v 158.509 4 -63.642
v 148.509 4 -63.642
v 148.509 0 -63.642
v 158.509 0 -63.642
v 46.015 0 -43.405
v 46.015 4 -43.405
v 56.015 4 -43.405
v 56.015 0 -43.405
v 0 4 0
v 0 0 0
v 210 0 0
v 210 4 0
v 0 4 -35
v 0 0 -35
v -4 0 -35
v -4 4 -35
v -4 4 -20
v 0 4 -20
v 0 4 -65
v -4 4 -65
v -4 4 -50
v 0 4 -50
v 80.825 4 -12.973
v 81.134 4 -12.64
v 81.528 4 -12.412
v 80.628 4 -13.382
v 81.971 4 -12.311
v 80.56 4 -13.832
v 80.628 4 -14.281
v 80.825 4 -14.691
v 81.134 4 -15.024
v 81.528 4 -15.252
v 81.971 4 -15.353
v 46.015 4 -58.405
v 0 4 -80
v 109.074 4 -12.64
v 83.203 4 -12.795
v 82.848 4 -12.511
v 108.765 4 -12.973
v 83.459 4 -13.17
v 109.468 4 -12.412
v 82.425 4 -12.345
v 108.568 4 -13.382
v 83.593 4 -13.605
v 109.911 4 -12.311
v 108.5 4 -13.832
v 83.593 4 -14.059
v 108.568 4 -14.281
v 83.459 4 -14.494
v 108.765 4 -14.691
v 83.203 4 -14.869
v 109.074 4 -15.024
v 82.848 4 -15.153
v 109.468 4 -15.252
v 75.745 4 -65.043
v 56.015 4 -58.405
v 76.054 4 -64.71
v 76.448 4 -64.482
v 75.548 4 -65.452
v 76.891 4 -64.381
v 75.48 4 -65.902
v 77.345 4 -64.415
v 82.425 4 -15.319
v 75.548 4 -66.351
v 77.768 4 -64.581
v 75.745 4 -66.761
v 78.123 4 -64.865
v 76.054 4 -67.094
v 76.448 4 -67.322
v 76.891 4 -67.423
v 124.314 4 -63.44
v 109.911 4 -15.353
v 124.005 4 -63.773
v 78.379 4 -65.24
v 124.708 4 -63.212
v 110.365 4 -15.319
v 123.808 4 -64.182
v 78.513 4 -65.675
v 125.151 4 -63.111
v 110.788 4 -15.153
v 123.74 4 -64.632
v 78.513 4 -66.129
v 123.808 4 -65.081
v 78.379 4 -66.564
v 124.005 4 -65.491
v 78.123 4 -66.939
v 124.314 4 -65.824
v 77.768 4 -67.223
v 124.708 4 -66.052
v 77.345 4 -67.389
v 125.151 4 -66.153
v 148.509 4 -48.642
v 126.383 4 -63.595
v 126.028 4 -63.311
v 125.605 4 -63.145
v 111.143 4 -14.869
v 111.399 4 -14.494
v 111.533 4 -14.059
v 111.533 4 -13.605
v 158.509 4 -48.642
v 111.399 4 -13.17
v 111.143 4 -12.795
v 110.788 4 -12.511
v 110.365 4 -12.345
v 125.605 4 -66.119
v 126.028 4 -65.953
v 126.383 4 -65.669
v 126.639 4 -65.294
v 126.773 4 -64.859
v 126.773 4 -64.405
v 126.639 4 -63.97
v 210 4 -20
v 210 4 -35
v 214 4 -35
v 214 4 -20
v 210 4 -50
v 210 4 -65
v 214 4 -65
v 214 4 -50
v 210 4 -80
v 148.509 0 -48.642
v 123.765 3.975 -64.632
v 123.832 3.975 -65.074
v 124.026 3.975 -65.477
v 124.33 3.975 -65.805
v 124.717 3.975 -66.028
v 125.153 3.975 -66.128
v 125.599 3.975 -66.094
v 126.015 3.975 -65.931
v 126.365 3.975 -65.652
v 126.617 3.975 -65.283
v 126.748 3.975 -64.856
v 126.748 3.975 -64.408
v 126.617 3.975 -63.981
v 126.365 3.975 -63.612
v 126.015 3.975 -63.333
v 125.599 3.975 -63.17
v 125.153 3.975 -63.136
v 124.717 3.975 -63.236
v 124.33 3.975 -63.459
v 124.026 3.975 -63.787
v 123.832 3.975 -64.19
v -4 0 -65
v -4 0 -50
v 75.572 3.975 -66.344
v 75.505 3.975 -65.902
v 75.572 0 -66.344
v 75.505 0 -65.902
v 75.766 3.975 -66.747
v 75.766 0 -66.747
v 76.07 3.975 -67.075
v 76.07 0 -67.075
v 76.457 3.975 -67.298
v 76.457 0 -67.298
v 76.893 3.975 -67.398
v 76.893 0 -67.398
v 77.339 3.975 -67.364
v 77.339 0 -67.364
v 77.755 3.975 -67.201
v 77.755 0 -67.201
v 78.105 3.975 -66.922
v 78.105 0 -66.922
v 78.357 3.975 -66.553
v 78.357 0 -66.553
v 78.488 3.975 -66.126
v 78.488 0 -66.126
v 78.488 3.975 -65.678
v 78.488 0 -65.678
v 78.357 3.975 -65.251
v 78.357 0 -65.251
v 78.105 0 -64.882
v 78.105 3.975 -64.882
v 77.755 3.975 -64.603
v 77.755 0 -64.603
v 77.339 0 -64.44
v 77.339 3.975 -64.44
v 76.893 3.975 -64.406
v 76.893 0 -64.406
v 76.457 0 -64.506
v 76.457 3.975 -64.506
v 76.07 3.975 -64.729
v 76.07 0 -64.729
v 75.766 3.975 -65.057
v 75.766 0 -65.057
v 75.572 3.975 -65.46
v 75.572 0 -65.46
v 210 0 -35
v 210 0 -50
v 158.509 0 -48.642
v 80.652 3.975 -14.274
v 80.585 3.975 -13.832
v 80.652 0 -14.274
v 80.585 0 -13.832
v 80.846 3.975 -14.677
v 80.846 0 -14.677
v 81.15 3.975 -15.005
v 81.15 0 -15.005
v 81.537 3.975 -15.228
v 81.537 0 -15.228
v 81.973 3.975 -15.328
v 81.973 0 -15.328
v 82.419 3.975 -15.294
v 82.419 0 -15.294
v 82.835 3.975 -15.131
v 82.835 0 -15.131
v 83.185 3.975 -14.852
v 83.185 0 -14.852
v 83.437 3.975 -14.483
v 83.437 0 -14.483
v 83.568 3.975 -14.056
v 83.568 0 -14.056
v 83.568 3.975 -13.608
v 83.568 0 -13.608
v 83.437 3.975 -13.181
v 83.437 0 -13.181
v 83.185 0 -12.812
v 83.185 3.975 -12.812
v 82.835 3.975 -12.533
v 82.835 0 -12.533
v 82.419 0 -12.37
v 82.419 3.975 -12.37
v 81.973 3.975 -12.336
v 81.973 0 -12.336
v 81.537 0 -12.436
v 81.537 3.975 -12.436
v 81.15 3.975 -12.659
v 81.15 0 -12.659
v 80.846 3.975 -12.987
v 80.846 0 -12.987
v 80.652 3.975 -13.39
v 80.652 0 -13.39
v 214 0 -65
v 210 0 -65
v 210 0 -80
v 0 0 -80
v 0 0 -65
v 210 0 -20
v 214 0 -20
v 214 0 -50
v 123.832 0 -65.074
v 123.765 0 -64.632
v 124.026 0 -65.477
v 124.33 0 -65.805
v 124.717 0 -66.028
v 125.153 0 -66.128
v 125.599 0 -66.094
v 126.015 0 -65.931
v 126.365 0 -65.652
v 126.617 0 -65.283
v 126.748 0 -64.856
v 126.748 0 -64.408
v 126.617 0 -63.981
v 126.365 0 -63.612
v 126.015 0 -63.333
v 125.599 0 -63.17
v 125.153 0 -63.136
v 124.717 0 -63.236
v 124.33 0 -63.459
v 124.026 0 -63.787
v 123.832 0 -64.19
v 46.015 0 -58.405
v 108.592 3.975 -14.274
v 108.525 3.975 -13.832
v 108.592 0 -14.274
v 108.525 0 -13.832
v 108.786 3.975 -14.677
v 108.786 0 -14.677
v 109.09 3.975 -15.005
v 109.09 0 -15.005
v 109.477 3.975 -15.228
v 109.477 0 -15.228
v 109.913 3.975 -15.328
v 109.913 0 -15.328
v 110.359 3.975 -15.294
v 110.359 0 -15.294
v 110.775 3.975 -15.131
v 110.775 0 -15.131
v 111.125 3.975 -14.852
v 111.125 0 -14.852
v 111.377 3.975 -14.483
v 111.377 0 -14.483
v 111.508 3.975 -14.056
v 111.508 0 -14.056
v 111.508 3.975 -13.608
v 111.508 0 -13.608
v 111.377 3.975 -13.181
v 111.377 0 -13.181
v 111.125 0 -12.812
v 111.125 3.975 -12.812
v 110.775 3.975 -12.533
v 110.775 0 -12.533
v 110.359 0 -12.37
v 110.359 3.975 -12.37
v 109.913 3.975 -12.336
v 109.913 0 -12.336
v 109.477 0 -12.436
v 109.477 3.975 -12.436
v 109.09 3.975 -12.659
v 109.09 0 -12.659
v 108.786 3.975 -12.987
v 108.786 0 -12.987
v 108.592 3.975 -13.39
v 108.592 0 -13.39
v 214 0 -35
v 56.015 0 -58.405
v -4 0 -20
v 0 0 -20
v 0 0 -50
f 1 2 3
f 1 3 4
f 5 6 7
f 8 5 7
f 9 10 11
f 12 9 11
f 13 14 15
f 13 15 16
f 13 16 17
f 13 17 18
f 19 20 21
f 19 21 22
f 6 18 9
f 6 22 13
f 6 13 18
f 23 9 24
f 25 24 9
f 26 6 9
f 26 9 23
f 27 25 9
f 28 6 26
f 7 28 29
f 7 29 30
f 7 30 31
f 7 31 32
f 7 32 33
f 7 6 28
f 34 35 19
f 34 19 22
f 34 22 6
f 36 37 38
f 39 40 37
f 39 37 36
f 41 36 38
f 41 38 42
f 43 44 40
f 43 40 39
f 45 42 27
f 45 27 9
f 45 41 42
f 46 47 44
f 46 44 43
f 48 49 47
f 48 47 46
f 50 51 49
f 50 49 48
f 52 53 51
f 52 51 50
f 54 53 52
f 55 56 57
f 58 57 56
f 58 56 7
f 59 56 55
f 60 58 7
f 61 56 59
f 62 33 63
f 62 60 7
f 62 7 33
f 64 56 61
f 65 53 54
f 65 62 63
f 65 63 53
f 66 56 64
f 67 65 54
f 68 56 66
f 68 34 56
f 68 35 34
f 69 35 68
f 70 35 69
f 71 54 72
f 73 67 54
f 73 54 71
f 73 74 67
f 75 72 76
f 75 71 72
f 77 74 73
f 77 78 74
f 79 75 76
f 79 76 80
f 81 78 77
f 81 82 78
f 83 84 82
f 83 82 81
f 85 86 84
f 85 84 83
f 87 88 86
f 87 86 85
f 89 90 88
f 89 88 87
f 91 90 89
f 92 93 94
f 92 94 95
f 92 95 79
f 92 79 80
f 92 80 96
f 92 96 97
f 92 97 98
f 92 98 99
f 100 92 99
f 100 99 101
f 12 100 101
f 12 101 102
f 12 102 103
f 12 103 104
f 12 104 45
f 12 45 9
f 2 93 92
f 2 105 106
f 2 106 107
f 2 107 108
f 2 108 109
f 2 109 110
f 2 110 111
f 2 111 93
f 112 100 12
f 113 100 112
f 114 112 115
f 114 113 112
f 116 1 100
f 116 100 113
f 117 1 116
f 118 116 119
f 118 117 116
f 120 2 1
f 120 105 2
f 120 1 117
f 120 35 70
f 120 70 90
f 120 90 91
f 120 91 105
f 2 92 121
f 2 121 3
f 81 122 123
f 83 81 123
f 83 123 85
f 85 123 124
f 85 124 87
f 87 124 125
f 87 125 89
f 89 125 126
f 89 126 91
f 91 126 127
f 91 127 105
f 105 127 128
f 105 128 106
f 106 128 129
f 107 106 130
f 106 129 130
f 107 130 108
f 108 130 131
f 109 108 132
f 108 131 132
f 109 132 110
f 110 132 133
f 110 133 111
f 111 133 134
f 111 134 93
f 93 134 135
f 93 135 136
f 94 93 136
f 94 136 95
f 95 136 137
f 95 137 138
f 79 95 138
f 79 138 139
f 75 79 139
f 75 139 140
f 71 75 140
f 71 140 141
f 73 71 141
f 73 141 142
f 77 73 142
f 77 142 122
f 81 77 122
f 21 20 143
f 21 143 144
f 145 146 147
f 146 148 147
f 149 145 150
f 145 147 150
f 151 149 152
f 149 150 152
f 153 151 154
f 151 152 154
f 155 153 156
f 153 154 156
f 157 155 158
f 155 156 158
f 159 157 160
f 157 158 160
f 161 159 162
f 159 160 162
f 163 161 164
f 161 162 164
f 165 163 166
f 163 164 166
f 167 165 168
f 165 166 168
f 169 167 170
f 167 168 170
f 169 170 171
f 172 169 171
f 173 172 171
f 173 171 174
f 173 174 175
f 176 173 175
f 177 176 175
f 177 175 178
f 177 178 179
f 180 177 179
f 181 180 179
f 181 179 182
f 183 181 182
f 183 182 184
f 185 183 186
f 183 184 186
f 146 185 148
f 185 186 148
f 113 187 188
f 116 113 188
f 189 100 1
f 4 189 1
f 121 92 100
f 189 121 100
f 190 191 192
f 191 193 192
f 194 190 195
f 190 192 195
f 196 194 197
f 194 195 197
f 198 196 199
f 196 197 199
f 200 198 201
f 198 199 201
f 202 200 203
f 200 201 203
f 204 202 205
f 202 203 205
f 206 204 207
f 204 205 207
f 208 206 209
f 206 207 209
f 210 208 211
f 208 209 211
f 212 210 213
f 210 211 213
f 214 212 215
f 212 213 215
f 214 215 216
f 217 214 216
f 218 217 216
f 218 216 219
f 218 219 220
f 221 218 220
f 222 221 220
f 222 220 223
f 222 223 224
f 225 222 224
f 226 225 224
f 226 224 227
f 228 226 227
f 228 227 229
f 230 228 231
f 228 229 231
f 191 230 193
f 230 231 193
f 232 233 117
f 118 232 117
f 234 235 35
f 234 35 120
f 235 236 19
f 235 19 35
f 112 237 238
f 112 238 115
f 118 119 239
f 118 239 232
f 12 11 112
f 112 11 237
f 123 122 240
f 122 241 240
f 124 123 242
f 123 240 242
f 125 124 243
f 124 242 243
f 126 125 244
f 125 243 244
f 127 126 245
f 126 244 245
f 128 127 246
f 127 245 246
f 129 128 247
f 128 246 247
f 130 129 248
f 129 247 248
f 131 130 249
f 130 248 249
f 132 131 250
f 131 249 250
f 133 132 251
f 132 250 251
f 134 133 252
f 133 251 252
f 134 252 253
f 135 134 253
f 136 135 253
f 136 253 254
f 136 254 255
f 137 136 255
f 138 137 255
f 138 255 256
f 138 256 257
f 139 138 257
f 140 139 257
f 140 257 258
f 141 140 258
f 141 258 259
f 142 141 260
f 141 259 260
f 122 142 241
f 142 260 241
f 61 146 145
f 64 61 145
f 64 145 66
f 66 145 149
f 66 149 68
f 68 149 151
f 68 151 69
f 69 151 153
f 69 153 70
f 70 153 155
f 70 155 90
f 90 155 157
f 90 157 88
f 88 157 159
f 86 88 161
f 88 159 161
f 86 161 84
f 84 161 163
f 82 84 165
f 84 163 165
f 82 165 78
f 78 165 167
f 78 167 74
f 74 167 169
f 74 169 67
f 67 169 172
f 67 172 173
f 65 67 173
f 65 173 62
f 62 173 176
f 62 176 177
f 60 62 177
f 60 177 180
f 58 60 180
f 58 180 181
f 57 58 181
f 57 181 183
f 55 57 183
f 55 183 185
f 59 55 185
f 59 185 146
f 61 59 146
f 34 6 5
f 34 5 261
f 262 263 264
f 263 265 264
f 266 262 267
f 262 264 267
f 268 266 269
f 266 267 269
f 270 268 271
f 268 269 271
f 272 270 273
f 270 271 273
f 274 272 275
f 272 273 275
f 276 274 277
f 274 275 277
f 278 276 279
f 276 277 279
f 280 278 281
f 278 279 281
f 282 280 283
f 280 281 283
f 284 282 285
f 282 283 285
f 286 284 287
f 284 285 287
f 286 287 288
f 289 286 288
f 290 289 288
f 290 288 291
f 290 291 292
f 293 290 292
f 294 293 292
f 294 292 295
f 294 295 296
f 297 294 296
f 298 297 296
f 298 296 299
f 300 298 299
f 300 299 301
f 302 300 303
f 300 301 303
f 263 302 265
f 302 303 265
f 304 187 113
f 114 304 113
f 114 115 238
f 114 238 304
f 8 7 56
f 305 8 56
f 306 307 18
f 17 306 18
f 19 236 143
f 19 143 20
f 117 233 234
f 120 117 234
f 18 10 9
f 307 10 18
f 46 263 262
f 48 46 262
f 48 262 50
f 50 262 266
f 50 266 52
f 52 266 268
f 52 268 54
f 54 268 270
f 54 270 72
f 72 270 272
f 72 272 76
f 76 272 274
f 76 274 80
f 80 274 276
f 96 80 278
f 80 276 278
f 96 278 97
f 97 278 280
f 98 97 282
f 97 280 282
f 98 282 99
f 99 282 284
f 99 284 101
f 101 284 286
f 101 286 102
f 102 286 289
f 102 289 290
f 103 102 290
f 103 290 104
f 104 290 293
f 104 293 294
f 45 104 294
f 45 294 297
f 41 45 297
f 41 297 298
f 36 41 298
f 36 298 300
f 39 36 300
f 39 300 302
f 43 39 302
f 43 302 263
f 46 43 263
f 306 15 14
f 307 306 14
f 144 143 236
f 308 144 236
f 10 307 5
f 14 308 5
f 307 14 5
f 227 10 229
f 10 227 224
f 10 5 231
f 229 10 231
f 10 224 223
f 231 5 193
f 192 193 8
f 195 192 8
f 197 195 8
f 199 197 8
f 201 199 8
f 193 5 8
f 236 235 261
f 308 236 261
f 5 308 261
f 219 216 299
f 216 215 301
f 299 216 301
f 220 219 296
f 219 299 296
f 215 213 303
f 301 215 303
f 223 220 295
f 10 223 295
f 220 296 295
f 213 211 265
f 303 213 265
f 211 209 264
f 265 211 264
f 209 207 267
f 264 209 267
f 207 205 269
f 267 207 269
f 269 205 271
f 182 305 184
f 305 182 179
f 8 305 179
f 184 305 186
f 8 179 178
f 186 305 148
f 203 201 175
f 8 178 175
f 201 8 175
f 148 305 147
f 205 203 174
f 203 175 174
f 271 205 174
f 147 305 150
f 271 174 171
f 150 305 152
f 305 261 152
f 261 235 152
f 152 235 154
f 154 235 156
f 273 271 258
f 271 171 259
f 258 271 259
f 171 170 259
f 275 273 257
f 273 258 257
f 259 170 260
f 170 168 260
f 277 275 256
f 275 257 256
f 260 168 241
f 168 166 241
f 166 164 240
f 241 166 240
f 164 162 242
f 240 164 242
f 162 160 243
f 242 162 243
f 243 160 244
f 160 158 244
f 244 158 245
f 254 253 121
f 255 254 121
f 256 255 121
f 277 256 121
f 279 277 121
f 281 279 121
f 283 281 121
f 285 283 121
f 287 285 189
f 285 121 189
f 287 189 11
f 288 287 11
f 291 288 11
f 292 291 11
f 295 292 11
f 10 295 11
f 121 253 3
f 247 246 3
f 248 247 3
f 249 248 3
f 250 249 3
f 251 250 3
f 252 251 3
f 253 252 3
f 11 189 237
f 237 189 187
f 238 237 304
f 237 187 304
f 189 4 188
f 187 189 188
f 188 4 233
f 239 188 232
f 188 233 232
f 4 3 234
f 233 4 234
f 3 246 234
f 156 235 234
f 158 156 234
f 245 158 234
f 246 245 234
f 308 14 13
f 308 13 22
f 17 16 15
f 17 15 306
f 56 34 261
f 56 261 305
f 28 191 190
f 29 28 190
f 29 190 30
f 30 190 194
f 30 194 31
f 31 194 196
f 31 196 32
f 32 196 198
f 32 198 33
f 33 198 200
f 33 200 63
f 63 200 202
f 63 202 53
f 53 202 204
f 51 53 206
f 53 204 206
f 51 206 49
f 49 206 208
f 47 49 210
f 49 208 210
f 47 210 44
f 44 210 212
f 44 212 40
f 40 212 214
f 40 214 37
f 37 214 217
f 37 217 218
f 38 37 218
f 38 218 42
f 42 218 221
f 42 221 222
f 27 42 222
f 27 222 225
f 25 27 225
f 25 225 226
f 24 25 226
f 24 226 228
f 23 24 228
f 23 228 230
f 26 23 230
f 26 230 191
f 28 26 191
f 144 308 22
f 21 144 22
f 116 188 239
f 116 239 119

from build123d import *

# Parameters (mm, degrees)
SKETCH1_W                       = 210
SKETCH1_H                       = 80
BOSS_EXTRUDE1_DEPTH             = 4
SKETCH2_W                       = 10
SKETCH2_H                       = 15
CUT_EXTRUDE1_DEPTH              = 225.757647256
SKETCH3_W                       = 15
SKETCH3_H                       = 4
BOSS_EXTRUDE2_DEPTH             = 4
SKETCH4_W                       = 15
SKETCH4_H                       = 4
BOSS_EXTRUDE3_DEPTH             = 4
F_3_0MM_DOWEL_HOLE1_D           = 3
F_3_0MM_DOWEL_HOLE1_CSINK_D     = 3.05
F_3_0MM_DOWEL_HOLE1_CSINK_ANGLE = 90


with BuildPart() as part:
    # Sketch1 → Boss-Extrude1 (new body)
    with BuildSketch(Plane(origin=(0, 0, 0), x_dir=(1, 0, 0), z_dir=(0, 1, 0))):
        with Locations((105, 40)):
            Rectangle(SKETCH1_W, SKETCH1_H)
    extrude(amount=BOSS_EXTRUDE1_DEPTH)

    # Sketch2 → Cut-Extrude1 (cut, through all)
    with BuildSketch(Plane(origin=(0, 4, 0), x_dir=(1, 0, 0), z_dir=(0, 1, 0))):
        with Locations((153.509116539, 56.141774946)):
            Rectangle(SKETCH2_W, SKETCH2_H)
        with Locations((51.014837185, 50.904860517)):
            Rectangle(SKETCH2_W, SKETCH2_H)
    extrude(amount=-CUT_EXTRUDE1_DEPTH, mode=Mode.SUBTRACT)

    # Sketch3 → Boss-Extrude2 (add)
    with BuildSketch(Plane.ZY):
        with Locations((-57.5, 2)):
            Rectangle(SKETCH3_W, SKETCH3_H)
        with Locations((-27.5, 2)):
            Rectangle(SKETCH3_W, SKETCH3_H)
    extrude(amount=BOSS_EXTRUDE2_DEPTH)

    # Sketch4 → Boss-Extrude3 (add)
    with BuildSketch(Plane(origin=(210, 0, 0), x_dir=(0, 0, -1), z_dir=(1, 0, 0))):
        with Locations((57.5, 2)):
            Rectangle(SKETCH4_W, SKETCH4_H)
        with Locations((27.5, 2)):
            Rectangle(SKETCH4_W, SKETCH4_H)
    extrude(amount=BOSS_EXTRUDE3_DEPTH)

    # Ø3.0mm Dowel Hole1 (through all)
    with Locations(Plane(origin=(0, 4, 0), x_dir=(1, 0, 0), z_dir=(0, 1, 0))):
        with Locations((125.265241585, 64.631998291), (77.005241585, 65.901998291), (82.085241585, 13.831998291), (110.025241585, 13.831998291)):
            CounterSinkHole(F_3_0MM_DOWEL_HOLE1_D / 2, F_3_0MM_DOWEL_HOLE1_CSINK_D / 2, counter_sink_angle=F_3_0MM_DOWEL_HOLE1_CSINK_ANGLE)


solid = part.part
